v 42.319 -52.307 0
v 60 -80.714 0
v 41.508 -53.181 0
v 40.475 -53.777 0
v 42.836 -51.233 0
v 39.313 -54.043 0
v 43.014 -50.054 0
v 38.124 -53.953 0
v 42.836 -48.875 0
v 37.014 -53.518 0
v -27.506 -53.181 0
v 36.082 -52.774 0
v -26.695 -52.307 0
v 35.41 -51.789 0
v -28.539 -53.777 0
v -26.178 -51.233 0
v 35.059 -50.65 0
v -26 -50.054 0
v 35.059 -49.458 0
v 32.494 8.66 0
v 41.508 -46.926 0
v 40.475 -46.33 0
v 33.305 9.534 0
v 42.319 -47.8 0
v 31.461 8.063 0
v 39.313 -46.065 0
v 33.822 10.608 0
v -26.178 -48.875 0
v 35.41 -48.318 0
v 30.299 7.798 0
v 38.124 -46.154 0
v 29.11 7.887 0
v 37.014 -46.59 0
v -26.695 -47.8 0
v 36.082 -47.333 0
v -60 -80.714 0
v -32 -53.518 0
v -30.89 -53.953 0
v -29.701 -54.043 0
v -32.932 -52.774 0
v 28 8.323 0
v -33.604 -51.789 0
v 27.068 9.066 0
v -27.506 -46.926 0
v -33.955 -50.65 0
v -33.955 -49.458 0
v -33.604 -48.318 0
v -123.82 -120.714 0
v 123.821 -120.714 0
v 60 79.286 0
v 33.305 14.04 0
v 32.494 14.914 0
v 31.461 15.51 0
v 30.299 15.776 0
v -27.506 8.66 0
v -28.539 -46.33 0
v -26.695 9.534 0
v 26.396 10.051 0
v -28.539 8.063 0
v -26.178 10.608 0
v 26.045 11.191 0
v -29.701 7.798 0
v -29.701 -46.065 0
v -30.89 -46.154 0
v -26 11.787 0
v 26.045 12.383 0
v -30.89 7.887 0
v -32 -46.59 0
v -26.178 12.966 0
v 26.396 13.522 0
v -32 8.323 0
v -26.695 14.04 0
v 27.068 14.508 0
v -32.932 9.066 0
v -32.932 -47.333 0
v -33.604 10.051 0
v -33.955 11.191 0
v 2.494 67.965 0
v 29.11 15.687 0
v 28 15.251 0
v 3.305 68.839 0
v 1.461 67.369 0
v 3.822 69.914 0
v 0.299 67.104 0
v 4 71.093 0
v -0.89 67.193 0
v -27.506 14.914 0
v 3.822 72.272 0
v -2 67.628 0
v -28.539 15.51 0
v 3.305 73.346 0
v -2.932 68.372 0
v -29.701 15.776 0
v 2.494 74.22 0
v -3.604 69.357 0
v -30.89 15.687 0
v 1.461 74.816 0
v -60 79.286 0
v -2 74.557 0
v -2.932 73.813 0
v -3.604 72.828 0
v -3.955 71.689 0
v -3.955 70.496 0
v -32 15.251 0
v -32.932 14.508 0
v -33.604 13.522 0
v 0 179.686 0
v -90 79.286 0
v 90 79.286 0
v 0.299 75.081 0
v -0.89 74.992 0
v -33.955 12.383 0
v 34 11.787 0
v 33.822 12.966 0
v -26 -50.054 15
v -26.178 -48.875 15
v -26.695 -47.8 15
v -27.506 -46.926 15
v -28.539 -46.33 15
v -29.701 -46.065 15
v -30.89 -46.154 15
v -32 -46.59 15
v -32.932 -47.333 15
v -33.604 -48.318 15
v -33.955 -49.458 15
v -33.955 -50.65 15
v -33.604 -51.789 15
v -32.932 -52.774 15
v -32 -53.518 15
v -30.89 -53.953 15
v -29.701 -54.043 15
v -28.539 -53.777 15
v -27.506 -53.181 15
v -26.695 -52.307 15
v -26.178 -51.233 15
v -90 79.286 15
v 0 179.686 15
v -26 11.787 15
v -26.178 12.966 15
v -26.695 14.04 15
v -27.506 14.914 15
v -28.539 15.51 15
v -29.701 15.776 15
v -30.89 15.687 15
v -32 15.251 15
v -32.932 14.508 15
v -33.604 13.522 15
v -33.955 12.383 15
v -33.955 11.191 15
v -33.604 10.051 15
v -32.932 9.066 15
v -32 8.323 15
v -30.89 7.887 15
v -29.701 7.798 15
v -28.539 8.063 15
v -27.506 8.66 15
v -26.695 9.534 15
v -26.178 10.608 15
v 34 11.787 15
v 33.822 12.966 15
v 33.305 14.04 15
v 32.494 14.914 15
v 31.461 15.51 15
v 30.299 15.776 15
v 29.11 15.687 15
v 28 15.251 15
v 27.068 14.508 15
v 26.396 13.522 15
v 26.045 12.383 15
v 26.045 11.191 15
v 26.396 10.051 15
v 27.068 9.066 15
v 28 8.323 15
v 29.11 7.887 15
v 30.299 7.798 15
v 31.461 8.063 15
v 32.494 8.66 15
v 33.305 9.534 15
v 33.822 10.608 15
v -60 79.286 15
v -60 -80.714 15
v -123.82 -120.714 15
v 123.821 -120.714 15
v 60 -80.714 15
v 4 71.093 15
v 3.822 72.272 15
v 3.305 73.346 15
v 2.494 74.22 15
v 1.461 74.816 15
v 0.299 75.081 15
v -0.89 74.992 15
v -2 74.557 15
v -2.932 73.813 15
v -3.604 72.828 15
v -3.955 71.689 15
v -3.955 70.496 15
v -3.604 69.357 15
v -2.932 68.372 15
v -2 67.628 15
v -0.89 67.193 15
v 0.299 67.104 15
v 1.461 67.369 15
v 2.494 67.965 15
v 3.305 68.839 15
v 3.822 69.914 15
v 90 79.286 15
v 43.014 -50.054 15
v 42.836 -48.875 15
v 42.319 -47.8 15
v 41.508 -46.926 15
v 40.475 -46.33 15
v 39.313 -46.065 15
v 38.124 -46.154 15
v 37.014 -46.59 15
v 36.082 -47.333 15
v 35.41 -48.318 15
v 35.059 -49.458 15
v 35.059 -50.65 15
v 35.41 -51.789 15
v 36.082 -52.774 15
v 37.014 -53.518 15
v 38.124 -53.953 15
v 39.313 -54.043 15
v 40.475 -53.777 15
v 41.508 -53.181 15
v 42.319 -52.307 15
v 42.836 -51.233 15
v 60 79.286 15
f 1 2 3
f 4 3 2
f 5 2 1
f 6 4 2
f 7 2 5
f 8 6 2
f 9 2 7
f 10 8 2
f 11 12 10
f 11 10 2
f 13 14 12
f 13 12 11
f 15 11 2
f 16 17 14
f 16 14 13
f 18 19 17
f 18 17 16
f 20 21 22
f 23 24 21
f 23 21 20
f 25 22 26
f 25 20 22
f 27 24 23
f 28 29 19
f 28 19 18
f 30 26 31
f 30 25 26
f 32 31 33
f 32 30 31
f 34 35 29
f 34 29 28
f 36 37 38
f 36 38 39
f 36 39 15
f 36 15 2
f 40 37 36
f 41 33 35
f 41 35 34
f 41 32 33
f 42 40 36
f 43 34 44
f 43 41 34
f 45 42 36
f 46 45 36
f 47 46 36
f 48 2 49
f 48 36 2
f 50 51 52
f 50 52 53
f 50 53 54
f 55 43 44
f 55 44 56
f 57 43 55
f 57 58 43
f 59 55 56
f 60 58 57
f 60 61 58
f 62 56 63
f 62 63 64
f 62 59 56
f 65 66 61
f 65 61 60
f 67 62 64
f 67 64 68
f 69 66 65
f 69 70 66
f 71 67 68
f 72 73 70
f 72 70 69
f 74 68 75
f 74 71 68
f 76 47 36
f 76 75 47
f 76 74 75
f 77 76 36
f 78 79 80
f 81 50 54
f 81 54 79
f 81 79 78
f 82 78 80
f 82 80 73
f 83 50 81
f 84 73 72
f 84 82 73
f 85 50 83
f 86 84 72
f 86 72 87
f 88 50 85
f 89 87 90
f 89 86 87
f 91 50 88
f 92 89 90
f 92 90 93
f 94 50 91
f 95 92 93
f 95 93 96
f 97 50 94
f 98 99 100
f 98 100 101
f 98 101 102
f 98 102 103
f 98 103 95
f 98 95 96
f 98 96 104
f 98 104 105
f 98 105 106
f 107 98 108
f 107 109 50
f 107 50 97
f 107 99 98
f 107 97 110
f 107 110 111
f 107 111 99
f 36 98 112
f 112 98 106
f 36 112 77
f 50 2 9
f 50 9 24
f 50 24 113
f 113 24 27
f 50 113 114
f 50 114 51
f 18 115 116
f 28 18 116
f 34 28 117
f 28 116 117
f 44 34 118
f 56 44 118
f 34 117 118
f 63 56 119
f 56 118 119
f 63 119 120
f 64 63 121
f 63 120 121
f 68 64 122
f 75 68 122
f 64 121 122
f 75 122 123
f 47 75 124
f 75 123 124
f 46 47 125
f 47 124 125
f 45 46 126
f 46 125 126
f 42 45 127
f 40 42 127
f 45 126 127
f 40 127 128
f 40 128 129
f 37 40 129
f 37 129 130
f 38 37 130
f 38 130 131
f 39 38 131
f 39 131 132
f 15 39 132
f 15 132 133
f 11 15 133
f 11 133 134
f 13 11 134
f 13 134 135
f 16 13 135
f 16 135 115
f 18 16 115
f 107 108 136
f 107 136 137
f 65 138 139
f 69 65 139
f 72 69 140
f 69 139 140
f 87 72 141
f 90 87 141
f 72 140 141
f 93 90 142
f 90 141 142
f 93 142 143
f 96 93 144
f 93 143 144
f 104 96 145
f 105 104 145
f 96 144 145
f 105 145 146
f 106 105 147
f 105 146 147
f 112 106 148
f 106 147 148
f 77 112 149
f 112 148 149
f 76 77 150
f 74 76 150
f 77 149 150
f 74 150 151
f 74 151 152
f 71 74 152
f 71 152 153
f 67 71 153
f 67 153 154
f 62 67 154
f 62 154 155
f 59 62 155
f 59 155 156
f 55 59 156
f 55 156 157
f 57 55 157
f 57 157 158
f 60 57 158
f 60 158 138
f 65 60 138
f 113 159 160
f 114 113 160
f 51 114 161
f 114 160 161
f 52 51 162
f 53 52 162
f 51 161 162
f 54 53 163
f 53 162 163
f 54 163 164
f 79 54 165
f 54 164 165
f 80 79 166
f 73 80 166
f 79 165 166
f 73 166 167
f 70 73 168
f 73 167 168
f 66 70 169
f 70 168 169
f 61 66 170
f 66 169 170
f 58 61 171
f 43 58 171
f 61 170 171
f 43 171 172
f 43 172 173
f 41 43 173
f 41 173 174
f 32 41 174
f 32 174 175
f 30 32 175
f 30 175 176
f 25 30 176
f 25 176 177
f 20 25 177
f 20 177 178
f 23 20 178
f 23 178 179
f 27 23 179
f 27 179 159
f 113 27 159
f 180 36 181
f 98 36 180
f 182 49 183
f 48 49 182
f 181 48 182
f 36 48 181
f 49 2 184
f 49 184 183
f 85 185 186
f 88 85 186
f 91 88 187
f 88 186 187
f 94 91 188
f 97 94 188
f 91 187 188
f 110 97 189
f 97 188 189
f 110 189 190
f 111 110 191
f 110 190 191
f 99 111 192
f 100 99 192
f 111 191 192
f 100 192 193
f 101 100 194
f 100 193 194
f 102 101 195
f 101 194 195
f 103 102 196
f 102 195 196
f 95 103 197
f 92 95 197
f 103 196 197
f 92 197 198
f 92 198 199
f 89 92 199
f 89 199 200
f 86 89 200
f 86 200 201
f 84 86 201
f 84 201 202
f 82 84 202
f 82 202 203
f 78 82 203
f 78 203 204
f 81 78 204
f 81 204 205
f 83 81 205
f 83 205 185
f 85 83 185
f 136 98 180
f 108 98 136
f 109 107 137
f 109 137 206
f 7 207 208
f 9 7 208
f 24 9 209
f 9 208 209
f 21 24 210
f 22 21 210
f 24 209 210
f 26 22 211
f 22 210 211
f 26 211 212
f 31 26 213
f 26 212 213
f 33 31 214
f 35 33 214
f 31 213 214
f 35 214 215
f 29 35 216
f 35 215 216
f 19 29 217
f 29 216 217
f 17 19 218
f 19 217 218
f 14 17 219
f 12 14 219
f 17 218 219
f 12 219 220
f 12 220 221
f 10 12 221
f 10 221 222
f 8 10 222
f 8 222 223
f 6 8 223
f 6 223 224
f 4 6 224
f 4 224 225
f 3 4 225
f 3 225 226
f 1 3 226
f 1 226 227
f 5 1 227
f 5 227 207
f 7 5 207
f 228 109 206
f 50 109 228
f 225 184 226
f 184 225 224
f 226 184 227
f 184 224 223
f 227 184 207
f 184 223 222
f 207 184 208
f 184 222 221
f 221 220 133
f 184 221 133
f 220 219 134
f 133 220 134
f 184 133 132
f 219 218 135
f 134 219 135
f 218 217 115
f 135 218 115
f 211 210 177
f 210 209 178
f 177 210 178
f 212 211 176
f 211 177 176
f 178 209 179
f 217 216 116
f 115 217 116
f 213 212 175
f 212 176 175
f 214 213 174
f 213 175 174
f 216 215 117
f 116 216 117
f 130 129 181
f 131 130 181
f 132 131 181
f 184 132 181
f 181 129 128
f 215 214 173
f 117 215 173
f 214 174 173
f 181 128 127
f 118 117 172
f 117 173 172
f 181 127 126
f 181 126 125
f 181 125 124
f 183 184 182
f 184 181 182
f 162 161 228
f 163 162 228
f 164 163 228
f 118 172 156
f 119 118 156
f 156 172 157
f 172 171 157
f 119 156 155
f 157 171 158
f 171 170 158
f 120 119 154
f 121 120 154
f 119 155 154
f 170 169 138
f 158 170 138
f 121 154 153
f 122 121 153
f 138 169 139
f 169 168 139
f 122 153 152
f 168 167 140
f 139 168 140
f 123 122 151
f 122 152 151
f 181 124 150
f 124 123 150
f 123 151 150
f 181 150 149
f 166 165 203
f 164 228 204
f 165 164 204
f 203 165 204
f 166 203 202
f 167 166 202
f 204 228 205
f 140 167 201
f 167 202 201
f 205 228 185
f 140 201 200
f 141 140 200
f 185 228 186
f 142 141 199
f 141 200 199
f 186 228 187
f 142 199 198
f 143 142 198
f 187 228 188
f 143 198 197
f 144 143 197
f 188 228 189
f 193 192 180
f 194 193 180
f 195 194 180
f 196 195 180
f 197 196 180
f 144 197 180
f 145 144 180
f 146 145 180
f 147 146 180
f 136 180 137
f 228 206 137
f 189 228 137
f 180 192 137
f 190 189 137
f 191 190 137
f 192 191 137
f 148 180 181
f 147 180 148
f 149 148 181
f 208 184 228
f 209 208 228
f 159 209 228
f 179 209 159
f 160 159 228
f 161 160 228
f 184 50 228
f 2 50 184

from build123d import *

# Parameters (mm, degrees)
BOSS_EXTRU_1_DEPTH      = 15
ESQUISSE2_R             = 4
ENL_V_MAT_EXTRU_2_DEPTH = 60
ESQUISSE4_R             = 4
ENL_V_MAT_EXTRU_3_DEPTH = 60


with BuildPart() as part:
    # Esquisse1 → Boss.-Extru.1 (new body)
    with BuildSketch(Plane.XY):
        Polygon((60, -80.714285714), (123.820965425, -120.714285714), (-123.82, -120.714285714), (-60, -80.714285714), (-60, 79.285714286), (-90, 79.285714286), (0, 179.686053035), (90, 79.285714286), (60, 79.285714286), align=None)
    extrude(amount=BOSS_EXTRU_1_DEPTH)

    # Esquisse2 → Enlèv. mat.-Extru.2 (cut)
    with BuildSketch(Plane.XY.offset(15)):
        with Locations((0, 71.092567552)):
            Circle(ESQUISSE2_R)
    extrude(amount=-ENL_V_MAT_EXTRU_2_DEPTH, mode=Mode.SUBTRACT)

    # Esquisse4 → Enlèv. mat.-Extru.3 (cut)
    with BuildSketch(Plane.XY.offset(15)):
        with Locations((30, 11.786912572)):
            Circle(ESQUISSE4_R)
        with Locations((39.013840353, -50.053697219)):
            Circle(ESQUISSE4_R)
        with Locations((-30, 11.786912572)):
            Circle(ESQUISSE4_R)
        with Locations((-30, -50.053697219)):
            Circle(ESQUISSE4_R)
    extrude(amount=-ENL_V_MAT_EXTRU_3_DEPTH, mode=Mode.SUBTRACT)


solid = part.part
